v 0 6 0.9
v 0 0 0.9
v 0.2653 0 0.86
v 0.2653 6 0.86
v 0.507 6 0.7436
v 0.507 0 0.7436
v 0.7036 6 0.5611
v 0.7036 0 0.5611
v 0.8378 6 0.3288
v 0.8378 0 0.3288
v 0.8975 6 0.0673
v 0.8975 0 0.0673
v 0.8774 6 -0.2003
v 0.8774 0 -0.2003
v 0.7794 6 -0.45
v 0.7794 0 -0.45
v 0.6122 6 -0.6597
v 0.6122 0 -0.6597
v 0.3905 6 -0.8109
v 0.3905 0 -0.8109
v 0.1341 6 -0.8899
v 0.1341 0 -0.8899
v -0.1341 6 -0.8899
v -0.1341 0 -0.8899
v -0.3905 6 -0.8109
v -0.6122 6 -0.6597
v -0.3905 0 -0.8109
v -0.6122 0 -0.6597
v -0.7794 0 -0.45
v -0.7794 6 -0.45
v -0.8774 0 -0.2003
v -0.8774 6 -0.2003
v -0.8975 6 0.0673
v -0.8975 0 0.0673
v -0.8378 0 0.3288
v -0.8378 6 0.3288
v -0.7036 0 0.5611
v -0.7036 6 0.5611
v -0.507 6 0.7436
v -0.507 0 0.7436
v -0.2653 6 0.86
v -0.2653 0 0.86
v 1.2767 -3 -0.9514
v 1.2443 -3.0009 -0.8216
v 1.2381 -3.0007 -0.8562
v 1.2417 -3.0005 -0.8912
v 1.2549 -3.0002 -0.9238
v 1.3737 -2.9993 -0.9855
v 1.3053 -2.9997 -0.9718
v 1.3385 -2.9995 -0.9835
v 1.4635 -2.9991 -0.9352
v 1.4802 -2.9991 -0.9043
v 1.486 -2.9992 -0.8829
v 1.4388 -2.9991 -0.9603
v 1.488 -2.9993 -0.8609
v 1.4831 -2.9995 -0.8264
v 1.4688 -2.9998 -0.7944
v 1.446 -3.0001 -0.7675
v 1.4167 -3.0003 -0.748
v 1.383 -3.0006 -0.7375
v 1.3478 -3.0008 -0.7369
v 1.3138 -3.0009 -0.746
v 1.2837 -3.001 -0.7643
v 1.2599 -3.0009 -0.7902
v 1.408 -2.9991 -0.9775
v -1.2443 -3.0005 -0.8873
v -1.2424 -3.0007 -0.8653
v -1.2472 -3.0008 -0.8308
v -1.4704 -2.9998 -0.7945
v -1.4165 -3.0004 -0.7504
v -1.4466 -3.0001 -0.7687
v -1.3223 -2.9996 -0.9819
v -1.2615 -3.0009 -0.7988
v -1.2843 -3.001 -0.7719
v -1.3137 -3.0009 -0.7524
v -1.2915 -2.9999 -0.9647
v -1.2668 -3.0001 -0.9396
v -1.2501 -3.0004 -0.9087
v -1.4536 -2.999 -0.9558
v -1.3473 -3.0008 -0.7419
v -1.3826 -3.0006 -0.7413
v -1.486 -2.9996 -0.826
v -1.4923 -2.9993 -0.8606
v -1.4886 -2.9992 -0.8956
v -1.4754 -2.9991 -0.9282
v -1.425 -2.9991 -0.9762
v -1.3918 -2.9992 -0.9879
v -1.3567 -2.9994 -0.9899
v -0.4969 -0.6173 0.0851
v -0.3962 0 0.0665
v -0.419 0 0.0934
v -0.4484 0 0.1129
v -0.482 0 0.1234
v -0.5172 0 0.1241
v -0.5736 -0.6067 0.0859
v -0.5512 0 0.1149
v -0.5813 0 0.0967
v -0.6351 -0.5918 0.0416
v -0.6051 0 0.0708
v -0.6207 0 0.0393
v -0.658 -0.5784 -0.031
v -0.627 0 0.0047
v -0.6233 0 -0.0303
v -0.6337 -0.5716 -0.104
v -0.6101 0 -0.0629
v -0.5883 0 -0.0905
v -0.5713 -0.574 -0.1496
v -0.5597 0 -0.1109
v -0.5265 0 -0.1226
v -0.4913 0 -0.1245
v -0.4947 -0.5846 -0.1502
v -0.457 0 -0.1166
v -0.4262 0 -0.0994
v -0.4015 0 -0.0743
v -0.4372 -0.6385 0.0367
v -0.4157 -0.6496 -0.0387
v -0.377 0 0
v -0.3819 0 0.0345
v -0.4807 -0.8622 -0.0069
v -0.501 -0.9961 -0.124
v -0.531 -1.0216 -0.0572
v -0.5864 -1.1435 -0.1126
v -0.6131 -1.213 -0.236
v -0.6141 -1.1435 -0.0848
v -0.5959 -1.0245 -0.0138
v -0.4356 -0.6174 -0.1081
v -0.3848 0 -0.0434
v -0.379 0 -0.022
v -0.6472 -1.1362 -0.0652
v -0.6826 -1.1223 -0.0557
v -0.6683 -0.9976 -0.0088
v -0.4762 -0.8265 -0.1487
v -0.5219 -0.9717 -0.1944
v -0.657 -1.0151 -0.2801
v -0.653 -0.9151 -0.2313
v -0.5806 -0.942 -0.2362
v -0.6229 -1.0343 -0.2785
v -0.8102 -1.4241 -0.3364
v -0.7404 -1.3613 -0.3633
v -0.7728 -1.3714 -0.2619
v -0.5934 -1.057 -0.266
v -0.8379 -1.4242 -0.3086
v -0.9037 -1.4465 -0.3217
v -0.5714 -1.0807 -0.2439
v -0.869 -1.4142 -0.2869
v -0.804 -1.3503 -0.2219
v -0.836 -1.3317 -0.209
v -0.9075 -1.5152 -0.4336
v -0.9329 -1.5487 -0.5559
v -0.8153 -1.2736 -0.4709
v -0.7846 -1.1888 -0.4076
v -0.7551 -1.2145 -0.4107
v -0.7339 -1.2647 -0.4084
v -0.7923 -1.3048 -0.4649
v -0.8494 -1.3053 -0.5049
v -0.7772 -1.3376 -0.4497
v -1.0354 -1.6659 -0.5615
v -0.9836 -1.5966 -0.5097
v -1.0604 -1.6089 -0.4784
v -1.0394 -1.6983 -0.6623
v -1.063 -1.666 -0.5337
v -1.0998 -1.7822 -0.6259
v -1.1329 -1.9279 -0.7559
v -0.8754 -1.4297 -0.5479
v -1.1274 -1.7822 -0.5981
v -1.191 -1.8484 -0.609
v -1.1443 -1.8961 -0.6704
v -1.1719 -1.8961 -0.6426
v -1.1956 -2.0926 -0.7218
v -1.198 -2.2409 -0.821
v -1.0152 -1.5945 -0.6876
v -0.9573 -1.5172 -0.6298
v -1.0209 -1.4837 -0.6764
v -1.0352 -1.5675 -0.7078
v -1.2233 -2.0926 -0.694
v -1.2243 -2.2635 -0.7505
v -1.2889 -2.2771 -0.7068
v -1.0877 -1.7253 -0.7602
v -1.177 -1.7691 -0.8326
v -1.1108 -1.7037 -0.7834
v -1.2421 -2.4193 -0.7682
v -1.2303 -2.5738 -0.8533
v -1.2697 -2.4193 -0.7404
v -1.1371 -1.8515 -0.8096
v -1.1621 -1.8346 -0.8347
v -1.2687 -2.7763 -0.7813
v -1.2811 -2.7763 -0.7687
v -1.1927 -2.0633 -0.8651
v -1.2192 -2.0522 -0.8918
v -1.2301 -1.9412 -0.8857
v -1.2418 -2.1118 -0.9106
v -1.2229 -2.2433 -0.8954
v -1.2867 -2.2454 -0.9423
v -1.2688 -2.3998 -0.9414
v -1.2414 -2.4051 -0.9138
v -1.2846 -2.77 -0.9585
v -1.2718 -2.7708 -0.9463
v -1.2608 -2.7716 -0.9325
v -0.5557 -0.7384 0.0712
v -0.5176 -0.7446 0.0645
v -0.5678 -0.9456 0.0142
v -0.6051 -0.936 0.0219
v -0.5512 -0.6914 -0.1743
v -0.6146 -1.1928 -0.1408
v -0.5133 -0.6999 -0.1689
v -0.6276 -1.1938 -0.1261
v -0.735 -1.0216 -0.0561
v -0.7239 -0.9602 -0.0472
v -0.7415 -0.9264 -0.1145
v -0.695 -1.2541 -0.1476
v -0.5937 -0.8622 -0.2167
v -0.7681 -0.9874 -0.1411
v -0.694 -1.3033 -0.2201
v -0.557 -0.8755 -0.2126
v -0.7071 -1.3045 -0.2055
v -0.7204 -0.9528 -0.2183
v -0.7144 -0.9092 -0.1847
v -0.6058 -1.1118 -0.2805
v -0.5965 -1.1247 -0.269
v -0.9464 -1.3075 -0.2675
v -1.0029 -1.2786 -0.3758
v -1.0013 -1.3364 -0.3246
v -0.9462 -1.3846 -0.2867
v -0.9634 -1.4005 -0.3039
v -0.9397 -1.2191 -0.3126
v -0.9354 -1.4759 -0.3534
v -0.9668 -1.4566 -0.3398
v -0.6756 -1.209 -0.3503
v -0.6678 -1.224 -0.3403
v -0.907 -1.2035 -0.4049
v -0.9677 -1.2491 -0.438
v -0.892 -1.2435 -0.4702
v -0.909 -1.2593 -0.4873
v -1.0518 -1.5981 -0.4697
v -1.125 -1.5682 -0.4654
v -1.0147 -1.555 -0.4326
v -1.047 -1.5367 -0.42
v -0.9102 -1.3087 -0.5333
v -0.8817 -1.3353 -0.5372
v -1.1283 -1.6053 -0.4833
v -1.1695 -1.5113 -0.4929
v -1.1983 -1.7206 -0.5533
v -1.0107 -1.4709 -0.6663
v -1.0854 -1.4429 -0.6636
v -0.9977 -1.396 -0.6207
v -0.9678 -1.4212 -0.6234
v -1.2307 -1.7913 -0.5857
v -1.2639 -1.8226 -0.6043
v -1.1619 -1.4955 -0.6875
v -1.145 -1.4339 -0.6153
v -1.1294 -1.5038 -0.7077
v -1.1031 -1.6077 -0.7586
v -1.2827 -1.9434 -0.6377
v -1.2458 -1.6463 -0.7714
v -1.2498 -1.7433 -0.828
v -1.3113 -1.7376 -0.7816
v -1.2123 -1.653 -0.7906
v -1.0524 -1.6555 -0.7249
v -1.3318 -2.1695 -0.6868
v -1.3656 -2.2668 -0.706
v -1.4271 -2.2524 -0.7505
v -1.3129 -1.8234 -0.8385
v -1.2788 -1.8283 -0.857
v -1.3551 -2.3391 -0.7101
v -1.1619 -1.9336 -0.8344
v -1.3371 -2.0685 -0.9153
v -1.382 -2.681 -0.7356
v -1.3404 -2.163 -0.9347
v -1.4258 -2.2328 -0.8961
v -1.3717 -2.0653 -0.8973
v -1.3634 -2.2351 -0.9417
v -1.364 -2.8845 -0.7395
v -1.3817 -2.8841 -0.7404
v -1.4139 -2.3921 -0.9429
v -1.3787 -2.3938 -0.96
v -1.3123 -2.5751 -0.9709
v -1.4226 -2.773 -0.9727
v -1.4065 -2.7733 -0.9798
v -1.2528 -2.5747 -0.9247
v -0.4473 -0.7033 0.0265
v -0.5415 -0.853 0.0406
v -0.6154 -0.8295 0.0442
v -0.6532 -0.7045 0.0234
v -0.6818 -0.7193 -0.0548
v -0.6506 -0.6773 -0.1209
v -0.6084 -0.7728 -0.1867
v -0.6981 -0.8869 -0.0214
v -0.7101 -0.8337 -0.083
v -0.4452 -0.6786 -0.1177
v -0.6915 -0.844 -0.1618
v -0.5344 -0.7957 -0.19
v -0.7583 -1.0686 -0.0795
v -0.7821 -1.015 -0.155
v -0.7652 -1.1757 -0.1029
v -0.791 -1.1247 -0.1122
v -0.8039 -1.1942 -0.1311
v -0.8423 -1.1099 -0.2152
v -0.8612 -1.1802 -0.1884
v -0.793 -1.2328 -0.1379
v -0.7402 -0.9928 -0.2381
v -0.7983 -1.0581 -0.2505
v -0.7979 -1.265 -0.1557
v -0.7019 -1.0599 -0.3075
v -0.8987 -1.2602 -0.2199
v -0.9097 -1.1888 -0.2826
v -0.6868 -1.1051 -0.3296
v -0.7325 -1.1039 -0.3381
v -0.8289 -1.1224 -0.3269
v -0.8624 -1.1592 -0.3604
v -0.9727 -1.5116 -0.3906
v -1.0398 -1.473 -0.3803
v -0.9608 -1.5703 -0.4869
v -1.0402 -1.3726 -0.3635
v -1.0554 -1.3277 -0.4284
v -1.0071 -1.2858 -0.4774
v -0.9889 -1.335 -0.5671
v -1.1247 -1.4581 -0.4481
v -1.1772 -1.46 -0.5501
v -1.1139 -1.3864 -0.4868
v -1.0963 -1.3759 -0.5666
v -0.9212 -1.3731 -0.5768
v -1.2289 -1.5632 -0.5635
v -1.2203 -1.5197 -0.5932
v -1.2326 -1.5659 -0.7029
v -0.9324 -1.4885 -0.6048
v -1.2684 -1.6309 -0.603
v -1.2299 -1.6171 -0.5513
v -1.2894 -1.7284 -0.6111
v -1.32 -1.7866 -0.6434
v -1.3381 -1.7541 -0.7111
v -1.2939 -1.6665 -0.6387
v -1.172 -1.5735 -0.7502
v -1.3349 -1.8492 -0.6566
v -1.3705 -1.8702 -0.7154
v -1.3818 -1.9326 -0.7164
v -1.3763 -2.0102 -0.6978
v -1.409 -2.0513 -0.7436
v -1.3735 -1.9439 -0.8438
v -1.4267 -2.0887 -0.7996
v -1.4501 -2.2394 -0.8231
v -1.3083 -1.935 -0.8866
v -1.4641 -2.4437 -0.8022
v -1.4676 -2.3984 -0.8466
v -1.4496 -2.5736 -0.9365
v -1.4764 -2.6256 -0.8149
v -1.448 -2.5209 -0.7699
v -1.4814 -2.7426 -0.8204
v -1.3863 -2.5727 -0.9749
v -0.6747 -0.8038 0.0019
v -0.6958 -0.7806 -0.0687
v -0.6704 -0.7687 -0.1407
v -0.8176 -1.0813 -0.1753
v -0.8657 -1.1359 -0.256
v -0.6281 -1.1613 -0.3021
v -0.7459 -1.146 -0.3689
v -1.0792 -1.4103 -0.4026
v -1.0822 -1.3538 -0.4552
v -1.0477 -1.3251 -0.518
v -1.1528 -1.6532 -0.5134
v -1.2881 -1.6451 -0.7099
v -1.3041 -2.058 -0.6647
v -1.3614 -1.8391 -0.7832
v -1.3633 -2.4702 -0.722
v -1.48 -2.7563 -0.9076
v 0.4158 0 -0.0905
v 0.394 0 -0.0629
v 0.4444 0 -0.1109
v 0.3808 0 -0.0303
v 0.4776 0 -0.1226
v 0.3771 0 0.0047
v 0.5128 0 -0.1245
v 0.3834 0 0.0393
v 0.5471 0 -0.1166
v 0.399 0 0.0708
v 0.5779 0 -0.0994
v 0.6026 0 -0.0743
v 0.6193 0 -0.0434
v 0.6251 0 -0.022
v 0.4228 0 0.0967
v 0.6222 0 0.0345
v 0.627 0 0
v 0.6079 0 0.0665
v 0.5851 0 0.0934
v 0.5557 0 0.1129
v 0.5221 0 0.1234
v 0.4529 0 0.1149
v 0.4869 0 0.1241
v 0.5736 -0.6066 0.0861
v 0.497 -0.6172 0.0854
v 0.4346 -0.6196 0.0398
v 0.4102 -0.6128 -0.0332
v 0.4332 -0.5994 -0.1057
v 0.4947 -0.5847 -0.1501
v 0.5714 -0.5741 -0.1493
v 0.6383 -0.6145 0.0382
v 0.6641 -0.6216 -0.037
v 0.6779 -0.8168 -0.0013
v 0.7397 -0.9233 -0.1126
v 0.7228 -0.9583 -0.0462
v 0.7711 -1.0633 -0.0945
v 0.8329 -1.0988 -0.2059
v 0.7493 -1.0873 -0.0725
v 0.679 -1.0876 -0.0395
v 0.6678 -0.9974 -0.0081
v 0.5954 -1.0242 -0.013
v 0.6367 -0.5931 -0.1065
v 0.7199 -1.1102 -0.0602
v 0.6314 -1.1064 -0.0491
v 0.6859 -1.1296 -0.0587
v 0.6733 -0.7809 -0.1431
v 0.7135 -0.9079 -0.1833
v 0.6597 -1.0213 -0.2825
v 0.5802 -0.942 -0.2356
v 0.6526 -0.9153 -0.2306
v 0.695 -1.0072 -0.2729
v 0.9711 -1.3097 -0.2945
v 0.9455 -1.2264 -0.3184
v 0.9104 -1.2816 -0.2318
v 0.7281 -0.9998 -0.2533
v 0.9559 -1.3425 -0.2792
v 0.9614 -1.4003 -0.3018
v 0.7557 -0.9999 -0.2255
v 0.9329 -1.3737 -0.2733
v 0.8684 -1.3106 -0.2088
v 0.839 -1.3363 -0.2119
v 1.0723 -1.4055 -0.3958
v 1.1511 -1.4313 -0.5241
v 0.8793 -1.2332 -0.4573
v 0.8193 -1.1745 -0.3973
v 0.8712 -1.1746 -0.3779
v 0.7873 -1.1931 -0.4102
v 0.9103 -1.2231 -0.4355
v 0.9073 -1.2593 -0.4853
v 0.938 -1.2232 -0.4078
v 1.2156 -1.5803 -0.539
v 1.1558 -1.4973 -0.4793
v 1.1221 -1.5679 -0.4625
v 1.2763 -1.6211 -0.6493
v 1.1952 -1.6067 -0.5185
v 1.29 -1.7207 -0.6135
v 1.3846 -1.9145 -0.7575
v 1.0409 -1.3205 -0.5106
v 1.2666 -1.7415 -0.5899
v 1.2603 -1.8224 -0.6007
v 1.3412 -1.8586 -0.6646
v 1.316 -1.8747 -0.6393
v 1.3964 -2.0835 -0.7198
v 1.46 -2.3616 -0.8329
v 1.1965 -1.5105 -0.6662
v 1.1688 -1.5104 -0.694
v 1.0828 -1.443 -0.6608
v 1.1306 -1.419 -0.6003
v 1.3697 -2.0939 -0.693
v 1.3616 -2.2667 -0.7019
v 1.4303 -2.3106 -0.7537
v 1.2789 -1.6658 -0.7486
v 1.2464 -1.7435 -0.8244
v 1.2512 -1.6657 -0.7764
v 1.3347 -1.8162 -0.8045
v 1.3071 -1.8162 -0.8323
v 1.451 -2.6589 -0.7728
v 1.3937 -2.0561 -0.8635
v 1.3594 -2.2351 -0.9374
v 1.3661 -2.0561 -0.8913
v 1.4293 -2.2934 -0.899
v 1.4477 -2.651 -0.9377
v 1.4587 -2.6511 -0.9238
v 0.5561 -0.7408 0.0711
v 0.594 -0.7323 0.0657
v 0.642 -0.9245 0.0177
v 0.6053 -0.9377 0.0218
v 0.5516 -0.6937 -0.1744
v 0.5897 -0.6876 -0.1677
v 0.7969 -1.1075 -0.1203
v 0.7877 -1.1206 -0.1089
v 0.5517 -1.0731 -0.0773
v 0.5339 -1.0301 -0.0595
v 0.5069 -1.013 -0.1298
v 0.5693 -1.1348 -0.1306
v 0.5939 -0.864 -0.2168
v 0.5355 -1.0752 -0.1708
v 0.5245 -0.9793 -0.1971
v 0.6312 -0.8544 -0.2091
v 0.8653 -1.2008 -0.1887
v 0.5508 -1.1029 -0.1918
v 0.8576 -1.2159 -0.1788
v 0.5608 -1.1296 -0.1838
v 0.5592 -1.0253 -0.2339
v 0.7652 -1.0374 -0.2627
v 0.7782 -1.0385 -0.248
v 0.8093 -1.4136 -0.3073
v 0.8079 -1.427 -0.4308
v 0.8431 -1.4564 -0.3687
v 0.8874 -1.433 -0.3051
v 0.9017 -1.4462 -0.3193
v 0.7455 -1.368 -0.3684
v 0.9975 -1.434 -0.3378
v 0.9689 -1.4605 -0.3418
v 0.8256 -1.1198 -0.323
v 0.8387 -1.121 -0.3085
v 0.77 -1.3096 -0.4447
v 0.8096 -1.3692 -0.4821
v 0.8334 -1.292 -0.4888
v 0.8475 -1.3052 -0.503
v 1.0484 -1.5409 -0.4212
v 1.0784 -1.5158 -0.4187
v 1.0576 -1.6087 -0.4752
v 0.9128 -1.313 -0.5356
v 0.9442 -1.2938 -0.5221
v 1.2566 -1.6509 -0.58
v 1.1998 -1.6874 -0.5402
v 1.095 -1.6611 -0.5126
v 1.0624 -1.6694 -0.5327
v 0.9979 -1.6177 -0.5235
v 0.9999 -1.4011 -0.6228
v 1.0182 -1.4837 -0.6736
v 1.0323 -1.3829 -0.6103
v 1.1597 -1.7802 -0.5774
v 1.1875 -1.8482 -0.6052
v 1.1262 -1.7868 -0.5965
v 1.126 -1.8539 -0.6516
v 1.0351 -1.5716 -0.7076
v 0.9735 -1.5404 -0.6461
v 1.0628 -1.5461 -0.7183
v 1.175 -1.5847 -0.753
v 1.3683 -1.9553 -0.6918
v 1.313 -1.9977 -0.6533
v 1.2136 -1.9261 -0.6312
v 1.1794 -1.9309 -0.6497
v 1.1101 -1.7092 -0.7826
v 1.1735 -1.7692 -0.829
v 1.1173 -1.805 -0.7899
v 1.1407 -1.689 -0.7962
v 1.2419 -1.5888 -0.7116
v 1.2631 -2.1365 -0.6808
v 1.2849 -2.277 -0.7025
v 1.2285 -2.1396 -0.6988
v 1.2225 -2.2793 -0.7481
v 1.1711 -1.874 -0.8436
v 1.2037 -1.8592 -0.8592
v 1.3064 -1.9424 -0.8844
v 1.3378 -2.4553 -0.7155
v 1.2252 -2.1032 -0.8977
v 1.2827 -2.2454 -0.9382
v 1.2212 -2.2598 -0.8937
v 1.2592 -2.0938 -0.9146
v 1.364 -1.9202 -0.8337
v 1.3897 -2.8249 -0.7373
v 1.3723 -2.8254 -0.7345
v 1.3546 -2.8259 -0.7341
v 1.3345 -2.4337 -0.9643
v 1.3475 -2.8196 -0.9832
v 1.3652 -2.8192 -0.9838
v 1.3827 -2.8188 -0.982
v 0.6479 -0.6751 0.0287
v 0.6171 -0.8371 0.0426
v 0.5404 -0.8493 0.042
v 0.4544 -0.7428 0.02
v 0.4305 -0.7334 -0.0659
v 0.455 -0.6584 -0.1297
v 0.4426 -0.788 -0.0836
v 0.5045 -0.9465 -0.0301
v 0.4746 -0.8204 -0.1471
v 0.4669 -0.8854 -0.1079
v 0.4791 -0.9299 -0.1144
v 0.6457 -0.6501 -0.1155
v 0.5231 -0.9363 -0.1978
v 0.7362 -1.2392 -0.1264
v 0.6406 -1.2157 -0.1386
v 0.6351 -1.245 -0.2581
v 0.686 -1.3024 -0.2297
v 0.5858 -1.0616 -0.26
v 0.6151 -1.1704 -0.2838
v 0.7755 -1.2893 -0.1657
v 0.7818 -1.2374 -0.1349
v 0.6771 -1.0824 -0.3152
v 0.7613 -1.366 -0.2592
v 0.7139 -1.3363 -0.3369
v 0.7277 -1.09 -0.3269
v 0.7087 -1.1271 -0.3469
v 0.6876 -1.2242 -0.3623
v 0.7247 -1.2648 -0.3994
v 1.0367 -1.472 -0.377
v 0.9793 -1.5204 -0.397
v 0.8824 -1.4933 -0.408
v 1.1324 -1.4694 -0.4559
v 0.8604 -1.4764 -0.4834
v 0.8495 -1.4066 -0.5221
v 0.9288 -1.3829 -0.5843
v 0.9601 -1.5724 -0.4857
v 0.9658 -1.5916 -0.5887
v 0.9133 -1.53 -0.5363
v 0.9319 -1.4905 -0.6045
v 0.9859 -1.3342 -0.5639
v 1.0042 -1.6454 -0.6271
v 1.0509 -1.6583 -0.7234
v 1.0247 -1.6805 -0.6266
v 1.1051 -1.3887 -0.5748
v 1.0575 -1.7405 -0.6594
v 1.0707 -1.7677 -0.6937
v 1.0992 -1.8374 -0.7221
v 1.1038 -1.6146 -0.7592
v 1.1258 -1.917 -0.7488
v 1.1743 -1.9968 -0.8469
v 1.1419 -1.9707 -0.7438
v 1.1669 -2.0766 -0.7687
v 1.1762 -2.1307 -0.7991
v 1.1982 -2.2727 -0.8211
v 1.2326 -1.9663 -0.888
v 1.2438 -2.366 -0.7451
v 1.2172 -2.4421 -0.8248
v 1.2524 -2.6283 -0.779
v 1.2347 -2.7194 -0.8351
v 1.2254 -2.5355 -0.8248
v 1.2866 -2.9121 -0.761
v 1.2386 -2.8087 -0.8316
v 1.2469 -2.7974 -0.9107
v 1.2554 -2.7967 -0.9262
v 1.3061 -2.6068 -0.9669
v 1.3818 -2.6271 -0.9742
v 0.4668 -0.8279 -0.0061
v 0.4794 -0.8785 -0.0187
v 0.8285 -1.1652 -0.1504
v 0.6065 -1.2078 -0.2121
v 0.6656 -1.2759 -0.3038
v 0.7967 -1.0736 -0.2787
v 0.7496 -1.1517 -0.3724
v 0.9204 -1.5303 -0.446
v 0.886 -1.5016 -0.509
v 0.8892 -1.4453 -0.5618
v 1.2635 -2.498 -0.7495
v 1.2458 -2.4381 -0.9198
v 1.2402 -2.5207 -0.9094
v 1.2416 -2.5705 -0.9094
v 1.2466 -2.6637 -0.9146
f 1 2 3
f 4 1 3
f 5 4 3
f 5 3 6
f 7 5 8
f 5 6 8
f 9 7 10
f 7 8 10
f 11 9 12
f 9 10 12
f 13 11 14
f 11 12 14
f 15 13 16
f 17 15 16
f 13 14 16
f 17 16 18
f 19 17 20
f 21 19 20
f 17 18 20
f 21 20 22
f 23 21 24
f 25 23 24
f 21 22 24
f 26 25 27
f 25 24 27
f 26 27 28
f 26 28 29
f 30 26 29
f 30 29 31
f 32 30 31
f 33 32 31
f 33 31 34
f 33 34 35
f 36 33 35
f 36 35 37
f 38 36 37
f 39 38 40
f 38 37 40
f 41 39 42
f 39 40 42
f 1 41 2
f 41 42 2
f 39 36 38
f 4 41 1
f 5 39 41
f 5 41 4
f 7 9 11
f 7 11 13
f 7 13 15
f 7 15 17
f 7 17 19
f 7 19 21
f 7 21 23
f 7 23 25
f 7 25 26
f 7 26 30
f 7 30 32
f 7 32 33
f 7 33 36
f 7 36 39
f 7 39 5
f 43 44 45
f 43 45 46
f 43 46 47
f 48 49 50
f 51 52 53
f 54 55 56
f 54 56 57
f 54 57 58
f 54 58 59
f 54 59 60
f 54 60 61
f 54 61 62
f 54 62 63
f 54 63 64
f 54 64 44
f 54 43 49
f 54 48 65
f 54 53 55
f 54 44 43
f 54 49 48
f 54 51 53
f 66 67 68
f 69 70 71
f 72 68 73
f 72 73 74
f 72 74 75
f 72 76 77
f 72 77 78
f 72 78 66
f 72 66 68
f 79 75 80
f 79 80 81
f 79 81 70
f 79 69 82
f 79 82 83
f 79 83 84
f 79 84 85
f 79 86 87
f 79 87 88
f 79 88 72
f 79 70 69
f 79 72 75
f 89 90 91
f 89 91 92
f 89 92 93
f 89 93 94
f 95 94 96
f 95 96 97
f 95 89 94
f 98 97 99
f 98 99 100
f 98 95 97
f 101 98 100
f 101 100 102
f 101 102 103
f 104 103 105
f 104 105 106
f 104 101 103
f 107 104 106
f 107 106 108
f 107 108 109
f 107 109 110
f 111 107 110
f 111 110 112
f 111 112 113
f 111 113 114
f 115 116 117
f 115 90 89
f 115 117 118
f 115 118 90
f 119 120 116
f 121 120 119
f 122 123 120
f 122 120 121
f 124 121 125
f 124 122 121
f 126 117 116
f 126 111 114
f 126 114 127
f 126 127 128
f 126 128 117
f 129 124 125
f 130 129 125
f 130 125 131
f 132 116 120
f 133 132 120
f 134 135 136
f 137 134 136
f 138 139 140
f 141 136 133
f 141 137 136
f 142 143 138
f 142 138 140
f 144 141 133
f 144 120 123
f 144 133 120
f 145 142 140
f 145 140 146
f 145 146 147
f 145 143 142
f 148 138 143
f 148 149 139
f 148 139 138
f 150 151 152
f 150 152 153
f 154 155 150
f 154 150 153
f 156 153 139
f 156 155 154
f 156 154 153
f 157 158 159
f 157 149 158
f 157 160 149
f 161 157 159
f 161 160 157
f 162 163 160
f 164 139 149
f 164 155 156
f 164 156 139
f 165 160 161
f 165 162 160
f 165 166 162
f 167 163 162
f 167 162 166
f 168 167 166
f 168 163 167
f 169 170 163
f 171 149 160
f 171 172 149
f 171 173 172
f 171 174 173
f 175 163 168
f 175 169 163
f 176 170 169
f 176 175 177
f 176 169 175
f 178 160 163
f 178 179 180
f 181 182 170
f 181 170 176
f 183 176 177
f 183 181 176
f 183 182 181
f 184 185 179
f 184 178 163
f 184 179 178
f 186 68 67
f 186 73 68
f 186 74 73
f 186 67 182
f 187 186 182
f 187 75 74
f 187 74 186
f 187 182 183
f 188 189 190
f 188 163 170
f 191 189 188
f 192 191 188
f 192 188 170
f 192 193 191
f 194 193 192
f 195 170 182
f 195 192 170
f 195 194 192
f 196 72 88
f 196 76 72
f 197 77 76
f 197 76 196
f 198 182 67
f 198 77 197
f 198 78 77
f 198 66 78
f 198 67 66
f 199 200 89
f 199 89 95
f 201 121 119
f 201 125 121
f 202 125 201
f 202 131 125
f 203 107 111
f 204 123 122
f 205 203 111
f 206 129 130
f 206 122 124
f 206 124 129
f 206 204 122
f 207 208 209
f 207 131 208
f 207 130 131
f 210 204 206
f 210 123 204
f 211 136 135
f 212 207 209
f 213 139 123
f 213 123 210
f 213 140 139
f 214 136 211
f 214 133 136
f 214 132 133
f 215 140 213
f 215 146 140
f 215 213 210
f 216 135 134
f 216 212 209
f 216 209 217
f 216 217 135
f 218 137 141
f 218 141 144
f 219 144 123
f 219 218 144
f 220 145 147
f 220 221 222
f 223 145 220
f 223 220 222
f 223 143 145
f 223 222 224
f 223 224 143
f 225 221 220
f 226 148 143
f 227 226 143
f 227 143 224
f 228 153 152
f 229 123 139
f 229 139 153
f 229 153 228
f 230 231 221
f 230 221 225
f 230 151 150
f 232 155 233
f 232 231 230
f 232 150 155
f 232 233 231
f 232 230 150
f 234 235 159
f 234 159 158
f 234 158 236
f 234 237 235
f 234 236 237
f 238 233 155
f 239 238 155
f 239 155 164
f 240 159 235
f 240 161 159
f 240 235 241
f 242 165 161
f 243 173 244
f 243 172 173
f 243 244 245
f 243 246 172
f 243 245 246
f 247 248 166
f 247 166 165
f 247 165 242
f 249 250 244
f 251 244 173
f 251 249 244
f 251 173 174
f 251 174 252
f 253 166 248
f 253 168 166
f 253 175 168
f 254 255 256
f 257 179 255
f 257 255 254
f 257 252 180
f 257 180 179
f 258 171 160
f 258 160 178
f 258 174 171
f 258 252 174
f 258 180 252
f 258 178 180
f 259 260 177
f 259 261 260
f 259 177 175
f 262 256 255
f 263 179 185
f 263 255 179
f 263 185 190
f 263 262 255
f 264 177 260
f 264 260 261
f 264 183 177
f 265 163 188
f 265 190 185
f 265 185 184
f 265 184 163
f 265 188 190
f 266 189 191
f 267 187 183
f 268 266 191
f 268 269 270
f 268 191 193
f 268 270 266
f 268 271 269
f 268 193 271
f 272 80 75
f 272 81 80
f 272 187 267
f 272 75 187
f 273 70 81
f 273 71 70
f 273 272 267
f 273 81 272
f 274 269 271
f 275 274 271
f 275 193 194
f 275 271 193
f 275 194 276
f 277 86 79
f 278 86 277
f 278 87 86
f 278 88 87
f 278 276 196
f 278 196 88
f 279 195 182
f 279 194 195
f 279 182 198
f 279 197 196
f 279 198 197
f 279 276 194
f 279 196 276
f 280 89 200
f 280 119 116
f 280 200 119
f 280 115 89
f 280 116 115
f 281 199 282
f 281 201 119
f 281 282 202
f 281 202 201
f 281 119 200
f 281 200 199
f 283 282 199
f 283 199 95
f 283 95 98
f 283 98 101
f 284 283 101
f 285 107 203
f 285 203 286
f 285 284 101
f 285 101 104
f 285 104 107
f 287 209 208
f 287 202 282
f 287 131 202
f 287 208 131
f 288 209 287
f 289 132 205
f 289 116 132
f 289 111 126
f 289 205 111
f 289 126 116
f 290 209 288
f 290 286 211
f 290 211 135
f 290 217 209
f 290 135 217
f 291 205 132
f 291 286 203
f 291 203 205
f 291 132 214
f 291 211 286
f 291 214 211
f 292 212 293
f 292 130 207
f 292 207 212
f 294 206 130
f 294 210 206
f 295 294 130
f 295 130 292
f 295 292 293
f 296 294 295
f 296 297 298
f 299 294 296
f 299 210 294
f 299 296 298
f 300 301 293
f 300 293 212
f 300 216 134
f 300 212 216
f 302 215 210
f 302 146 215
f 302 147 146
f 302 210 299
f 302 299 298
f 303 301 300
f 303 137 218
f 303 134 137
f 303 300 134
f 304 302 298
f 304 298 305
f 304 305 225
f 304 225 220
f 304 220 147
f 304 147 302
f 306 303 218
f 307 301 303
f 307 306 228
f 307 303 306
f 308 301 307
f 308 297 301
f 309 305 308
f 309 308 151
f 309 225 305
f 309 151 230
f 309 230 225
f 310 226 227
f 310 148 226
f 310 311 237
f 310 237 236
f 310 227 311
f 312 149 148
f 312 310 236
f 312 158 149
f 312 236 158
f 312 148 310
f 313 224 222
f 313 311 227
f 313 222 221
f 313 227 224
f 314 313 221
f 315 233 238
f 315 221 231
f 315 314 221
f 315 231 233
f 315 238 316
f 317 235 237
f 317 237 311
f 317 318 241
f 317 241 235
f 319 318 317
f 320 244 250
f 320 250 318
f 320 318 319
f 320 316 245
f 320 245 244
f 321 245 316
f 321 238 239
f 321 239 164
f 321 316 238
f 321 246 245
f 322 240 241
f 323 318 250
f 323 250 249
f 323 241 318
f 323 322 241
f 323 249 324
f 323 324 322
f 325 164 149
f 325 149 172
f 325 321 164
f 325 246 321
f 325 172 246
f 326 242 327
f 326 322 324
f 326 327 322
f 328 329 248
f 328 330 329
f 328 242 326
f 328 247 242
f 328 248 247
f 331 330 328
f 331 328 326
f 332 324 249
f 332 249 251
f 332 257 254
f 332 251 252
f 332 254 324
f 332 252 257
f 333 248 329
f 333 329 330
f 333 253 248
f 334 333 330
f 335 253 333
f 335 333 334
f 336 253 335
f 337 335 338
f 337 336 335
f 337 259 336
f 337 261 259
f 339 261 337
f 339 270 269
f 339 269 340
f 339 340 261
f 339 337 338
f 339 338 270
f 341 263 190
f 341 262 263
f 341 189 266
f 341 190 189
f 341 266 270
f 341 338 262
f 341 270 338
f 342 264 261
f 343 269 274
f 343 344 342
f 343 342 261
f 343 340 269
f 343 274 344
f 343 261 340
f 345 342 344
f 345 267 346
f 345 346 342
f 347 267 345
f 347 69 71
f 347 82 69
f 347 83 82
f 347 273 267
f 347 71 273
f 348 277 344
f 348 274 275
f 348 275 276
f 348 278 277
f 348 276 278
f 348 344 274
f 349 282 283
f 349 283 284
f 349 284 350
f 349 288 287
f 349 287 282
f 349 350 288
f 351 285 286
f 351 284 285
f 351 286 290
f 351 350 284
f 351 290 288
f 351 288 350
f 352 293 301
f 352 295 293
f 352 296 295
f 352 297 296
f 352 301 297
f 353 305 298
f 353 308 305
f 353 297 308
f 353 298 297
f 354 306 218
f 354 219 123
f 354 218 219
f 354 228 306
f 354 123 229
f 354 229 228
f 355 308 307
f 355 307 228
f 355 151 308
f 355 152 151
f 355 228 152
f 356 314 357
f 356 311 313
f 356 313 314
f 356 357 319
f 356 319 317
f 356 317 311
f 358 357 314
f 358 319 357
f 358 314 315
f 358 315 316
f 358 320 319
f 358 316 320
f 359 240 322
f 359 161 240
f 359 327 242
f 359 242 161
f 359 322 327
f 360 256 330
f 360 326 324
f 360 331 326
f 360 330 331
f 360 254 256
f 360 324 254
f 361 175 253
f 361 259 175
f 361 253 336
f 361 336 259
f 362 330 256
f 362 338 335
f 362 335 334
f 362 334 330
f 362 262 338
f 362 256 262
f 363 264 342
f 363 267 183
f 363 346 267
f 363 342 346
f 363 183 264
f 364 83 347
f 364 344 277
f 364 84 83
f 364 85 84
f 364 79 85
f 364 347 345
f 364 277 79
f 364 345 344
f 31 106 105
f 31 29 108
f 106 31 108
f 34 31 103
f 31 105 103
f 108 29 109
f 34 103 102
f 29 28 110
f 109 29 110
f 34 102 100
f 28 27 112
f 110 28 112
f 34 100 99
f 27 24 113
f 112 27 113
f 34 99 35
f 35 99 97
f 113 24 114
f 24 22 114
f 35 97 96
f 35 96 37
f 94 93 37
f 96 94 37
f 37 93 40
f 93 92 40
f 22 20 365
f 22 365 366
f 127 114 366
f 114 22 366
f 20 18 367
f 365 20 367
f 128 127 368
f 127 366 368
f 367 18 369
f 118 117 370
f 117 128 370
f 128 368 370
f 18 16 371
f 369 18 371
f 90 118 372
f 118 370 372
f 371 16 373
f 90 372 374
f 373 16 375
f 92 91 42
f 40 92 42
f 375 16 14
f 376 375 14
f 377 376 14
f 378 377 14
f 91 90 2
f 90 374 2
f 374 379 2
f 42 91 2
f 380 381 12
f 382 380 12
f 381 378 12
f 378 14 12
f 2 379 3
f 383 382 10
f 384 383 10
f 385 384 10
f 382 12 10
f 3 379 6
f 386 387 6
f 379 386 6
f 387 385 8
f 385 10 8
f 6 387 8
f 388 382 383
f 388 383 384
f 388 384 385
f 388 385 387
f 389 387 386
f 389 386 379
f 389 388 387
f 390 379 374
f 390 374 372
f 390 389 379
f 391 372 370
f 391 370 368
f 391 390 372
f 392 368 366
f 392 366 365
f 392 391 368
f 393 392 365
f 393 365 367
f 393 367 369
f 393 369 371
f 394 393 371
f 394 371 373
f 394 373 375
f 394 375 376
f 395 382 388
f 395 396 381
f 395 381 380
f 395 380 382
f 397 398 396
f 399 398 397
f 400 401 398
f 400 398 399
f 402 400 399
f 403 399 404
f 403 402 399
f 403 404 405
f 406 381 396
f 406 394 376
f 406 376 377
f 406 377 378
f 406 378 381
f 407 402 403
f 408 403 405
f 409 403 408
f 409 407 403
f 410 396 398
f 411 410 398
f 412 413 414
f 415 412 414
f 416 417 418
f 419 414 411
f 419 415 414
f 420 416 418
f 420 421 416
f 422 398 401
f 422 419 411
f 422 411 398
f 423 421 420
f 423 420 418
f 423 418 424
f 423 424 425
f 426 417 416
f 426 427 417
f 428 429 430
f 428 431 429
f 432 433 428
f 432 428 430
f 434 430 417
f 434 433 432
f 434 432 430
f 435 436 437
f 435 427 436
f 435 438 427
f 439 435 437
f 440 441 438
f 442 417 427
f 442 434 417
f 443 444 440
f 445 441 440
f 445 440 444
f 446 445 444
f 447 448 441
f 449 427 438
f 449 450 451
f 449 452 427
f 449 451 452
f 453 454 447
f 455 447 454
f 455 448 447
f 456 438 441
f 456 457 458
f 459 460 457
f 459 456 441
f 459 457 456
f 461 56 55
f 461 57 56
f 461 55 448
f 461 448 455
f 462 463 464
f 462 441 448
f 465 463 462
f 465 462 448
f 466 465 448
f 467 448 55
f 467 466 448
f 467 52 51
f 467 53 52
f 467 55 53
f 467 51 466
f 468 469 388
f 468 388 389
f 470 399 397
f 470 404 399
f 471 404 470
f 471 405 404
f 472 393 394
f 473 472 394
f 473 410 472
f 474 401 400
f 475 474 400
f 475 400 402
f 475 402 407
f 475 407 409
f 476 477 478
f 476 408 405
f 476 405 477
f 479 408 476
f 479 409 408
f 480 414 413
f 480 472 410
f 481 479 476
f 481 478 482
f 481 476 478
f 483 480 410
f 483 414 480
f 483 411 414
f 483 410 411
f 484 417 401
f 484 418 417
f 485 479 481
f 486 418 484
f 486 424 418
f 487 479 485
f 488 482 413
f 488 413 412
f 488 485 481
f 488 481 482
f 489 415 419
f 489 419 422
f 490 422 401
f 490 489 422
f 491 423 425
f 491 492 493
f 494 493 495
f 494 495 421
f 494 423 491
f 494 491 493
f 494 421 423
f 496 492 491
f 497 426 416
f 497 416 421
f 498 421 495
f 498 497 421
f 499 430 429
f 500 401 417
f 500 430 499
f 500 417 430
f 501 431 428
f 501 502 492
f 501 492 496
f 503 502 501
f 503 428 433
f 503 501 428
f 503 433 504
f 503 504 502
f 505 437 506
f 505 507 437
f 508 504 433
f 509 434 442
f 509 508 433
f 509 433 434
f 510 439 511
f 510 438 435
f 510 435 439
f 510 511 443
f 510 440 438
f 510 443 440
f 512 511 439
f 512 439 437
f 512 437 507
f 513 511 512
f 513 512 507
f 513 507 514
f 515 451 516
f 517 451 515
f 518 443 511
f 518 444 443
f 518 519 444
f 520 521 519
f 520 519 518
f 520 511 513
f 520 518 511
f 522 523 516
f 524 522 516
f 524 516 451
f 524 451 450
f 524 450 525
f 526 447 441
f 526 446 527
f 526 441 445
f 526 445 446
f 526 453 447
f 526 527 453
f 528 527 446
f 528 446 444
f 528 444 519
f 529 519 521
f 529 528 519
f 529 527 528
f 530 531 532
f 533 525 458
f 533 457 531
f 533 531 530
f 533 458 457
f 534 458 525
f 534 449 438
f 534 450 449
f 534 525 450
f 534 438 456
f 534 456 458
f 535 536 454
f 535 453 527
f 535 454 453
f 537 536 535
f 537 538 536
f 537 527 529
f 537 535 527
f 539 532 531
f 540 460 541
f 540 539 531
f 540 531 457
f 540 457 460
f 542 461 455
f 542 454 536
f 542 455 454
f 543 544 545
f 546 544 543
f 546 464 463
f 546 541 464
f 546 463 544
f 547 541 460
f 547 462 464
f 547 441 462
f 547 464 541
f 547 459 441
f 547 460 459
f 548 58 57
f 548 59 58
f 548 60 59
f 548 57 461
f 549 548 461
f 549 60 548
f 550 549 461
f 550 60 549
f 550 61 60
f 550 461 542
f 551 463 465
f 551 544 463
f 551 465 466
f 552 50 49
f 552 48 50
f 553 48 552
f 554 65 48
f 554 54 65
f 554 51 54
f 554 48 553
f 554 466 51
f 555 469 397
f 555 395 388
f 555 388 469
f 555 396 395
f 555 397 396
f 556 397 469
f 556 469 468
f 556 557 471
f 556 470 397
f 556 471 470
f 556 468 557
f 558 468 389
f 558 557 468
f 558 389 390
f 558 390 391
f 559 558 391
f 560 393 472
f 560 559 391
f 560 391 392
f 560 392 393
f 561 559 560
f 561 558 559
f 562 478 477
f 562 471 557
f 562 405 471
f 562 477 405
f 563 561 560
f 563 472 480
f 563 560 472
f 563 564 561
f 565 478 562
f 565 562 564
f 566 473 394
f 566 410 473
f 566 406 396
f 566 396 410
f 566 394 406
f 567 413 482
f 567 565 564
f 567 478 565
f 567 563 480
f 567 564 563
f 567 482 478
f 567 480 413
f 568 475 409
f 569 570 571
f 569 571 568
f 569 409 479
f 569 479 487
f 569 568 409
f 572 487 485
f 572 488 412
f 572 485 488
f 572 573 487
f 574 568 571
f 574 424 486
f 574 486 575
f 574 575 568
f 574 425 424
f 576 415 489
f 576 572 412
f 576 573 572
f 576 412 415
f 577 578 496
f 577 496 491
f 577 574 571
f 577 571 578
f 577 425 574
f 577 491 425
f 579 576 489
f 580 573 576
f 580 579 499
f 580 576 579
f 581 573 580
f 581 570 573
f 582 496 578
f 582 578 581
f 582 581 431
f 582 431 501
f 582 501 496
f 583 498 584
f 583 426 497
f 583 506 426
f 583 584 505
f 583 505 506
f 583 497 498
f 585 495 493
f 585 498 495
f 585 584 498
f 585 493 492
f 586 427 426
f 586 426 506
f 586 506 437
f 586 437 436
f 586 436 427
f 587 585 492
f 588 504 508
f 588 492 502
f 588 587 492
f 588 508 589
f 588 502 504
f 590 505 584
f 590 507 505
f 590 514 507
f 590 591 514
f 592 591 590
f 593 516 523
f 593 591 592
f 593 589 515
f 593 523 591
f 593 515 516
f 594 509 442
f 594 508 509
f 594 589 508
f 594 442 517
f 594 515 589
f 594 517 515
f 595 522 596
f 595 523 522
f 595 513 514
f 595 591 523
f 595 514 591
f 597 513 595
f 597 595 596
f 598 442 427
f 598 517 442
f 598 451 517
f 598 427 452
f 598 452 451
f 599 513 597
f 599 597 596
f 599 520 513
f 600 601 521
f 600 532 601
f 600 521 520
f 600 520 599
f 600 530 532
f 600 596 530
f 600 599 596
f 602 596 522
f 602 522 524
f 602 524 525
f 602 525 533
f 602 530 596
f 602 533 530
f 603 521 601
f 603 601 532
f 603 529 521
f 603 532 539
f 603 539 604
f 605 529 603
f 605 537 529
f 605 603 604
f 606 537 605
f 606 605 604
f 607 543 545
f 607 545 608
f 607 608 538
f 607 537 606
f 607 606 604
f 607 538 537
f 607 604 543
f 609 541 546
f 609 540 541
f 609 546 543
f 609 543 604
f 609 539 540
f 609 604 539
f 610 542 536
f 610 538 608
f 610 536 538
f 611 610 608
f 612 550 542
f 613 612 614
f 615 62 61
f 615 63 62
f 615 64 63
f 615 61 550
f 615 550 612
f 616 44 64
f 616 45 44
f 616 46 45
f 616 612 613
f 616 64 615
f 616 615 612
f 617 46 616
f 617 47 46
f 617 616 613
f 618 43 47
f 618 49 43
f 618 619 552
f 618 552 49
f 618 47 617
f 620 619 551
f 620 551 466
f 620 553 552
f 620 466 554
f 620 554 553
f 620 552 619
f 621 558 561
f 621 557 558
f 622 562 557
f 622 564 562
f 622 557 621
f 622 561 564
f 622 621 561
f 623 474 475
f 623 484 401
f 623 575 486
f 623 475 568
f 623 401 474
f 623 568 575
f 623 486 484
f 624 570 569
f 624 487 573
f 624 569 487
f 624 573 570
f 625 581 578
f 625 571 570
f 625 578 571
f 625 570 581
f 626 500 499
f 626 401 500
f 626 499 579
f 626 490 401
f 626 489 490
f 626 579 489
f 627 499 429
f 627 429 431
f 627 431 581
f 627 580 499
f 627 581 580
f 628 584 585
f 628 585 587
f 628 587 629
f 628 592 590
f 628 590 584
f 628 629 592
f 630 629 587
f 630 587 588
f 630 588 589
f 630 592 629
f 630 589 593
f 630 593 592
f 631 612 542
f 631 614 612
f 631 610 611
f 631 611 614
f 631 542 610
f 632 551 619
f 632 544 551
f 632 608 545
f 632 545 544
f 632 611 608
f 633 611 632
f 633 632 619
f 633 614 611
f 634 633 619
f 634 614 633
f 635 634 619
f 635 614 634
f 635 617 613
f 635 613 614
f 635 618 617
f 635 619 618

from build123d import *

# Parameters (mm, degrees)
SKETCH1_R           = 0.9
BOSS_EXTRUDE1_DEPTH = 6
SKETCH7_R           = 0.125
SKETCH8_R           = 0.125


with BuildPart() as part:
    # Sketch1 → Boss-Extrude1 (new body)
    with BuildSketch(Plane(origin=(0, 0, 0), x_dir=(1, 0, 0), z_dir=(0, 1, 0))):
        Circle(SKETCH1_R)
    extrude(amount=BOSS_EXTRUDE1_DEPTH)

    # Sweep1: sweep along a path in Sketch4
    with BuildLine() as sweep1_path:  # in the path sketch's own coordinates; laid on its plane below (add() does not lay a ready-made edge on the line's plane)
        add(Edge.make_bspline(
            [(0, -0.355), (2.024905843, -0.343321446), (0.641829723, -1.574292855), (3, -1.578751128)],
            knots=[0, 0, 0, 0, 1, 1, 1, 1], degree=3))
    # Sketch7 → Sweep1 (sweep)
    with BuildSketch(Plane.XZ):
        with Locations((-0.502045815, 0)):
            Circle(SKETCH7_R)
    sweep(path=Plane(origin=(-0.251022907, 0, 0.251022907), x_dir=(0, -1, 0), z_dir=(-0.7071067811865488, 0, 0.7071067811865464)) * sweep1_path.line)

    # Sweep2: sweep along a path in Sketch6
    with BuildLine() as sweep2_path:  # in the path sketch's own coordinates; laid on its plane below (add() does not lay a ready-made edge on the line's plane)
        add(Edge.make_bspline(
            [(0, -0.355), (2.024905843, -0.343321446), (0.641829723, -1.568079226), (3, -1.572537499)],
            knots=[0, 0, 0, 0, 1, 1, 1, 1], degree=3))
    # Sketch8 → Sweep2 (sweep)
    with BuildSketch(Plane.XZ):
        with Locations((0.502045815, 0)):
            Circle(SKETCH8_R)
    sweep(path=Plane(origin=(0.251022907, 0, 0.251022907), x_dir=(0, -1, 0), z_dir=(-0.7071067811865464, 0, -0.7071067811865488)) * sweep2_path.line)


solid = part.part
